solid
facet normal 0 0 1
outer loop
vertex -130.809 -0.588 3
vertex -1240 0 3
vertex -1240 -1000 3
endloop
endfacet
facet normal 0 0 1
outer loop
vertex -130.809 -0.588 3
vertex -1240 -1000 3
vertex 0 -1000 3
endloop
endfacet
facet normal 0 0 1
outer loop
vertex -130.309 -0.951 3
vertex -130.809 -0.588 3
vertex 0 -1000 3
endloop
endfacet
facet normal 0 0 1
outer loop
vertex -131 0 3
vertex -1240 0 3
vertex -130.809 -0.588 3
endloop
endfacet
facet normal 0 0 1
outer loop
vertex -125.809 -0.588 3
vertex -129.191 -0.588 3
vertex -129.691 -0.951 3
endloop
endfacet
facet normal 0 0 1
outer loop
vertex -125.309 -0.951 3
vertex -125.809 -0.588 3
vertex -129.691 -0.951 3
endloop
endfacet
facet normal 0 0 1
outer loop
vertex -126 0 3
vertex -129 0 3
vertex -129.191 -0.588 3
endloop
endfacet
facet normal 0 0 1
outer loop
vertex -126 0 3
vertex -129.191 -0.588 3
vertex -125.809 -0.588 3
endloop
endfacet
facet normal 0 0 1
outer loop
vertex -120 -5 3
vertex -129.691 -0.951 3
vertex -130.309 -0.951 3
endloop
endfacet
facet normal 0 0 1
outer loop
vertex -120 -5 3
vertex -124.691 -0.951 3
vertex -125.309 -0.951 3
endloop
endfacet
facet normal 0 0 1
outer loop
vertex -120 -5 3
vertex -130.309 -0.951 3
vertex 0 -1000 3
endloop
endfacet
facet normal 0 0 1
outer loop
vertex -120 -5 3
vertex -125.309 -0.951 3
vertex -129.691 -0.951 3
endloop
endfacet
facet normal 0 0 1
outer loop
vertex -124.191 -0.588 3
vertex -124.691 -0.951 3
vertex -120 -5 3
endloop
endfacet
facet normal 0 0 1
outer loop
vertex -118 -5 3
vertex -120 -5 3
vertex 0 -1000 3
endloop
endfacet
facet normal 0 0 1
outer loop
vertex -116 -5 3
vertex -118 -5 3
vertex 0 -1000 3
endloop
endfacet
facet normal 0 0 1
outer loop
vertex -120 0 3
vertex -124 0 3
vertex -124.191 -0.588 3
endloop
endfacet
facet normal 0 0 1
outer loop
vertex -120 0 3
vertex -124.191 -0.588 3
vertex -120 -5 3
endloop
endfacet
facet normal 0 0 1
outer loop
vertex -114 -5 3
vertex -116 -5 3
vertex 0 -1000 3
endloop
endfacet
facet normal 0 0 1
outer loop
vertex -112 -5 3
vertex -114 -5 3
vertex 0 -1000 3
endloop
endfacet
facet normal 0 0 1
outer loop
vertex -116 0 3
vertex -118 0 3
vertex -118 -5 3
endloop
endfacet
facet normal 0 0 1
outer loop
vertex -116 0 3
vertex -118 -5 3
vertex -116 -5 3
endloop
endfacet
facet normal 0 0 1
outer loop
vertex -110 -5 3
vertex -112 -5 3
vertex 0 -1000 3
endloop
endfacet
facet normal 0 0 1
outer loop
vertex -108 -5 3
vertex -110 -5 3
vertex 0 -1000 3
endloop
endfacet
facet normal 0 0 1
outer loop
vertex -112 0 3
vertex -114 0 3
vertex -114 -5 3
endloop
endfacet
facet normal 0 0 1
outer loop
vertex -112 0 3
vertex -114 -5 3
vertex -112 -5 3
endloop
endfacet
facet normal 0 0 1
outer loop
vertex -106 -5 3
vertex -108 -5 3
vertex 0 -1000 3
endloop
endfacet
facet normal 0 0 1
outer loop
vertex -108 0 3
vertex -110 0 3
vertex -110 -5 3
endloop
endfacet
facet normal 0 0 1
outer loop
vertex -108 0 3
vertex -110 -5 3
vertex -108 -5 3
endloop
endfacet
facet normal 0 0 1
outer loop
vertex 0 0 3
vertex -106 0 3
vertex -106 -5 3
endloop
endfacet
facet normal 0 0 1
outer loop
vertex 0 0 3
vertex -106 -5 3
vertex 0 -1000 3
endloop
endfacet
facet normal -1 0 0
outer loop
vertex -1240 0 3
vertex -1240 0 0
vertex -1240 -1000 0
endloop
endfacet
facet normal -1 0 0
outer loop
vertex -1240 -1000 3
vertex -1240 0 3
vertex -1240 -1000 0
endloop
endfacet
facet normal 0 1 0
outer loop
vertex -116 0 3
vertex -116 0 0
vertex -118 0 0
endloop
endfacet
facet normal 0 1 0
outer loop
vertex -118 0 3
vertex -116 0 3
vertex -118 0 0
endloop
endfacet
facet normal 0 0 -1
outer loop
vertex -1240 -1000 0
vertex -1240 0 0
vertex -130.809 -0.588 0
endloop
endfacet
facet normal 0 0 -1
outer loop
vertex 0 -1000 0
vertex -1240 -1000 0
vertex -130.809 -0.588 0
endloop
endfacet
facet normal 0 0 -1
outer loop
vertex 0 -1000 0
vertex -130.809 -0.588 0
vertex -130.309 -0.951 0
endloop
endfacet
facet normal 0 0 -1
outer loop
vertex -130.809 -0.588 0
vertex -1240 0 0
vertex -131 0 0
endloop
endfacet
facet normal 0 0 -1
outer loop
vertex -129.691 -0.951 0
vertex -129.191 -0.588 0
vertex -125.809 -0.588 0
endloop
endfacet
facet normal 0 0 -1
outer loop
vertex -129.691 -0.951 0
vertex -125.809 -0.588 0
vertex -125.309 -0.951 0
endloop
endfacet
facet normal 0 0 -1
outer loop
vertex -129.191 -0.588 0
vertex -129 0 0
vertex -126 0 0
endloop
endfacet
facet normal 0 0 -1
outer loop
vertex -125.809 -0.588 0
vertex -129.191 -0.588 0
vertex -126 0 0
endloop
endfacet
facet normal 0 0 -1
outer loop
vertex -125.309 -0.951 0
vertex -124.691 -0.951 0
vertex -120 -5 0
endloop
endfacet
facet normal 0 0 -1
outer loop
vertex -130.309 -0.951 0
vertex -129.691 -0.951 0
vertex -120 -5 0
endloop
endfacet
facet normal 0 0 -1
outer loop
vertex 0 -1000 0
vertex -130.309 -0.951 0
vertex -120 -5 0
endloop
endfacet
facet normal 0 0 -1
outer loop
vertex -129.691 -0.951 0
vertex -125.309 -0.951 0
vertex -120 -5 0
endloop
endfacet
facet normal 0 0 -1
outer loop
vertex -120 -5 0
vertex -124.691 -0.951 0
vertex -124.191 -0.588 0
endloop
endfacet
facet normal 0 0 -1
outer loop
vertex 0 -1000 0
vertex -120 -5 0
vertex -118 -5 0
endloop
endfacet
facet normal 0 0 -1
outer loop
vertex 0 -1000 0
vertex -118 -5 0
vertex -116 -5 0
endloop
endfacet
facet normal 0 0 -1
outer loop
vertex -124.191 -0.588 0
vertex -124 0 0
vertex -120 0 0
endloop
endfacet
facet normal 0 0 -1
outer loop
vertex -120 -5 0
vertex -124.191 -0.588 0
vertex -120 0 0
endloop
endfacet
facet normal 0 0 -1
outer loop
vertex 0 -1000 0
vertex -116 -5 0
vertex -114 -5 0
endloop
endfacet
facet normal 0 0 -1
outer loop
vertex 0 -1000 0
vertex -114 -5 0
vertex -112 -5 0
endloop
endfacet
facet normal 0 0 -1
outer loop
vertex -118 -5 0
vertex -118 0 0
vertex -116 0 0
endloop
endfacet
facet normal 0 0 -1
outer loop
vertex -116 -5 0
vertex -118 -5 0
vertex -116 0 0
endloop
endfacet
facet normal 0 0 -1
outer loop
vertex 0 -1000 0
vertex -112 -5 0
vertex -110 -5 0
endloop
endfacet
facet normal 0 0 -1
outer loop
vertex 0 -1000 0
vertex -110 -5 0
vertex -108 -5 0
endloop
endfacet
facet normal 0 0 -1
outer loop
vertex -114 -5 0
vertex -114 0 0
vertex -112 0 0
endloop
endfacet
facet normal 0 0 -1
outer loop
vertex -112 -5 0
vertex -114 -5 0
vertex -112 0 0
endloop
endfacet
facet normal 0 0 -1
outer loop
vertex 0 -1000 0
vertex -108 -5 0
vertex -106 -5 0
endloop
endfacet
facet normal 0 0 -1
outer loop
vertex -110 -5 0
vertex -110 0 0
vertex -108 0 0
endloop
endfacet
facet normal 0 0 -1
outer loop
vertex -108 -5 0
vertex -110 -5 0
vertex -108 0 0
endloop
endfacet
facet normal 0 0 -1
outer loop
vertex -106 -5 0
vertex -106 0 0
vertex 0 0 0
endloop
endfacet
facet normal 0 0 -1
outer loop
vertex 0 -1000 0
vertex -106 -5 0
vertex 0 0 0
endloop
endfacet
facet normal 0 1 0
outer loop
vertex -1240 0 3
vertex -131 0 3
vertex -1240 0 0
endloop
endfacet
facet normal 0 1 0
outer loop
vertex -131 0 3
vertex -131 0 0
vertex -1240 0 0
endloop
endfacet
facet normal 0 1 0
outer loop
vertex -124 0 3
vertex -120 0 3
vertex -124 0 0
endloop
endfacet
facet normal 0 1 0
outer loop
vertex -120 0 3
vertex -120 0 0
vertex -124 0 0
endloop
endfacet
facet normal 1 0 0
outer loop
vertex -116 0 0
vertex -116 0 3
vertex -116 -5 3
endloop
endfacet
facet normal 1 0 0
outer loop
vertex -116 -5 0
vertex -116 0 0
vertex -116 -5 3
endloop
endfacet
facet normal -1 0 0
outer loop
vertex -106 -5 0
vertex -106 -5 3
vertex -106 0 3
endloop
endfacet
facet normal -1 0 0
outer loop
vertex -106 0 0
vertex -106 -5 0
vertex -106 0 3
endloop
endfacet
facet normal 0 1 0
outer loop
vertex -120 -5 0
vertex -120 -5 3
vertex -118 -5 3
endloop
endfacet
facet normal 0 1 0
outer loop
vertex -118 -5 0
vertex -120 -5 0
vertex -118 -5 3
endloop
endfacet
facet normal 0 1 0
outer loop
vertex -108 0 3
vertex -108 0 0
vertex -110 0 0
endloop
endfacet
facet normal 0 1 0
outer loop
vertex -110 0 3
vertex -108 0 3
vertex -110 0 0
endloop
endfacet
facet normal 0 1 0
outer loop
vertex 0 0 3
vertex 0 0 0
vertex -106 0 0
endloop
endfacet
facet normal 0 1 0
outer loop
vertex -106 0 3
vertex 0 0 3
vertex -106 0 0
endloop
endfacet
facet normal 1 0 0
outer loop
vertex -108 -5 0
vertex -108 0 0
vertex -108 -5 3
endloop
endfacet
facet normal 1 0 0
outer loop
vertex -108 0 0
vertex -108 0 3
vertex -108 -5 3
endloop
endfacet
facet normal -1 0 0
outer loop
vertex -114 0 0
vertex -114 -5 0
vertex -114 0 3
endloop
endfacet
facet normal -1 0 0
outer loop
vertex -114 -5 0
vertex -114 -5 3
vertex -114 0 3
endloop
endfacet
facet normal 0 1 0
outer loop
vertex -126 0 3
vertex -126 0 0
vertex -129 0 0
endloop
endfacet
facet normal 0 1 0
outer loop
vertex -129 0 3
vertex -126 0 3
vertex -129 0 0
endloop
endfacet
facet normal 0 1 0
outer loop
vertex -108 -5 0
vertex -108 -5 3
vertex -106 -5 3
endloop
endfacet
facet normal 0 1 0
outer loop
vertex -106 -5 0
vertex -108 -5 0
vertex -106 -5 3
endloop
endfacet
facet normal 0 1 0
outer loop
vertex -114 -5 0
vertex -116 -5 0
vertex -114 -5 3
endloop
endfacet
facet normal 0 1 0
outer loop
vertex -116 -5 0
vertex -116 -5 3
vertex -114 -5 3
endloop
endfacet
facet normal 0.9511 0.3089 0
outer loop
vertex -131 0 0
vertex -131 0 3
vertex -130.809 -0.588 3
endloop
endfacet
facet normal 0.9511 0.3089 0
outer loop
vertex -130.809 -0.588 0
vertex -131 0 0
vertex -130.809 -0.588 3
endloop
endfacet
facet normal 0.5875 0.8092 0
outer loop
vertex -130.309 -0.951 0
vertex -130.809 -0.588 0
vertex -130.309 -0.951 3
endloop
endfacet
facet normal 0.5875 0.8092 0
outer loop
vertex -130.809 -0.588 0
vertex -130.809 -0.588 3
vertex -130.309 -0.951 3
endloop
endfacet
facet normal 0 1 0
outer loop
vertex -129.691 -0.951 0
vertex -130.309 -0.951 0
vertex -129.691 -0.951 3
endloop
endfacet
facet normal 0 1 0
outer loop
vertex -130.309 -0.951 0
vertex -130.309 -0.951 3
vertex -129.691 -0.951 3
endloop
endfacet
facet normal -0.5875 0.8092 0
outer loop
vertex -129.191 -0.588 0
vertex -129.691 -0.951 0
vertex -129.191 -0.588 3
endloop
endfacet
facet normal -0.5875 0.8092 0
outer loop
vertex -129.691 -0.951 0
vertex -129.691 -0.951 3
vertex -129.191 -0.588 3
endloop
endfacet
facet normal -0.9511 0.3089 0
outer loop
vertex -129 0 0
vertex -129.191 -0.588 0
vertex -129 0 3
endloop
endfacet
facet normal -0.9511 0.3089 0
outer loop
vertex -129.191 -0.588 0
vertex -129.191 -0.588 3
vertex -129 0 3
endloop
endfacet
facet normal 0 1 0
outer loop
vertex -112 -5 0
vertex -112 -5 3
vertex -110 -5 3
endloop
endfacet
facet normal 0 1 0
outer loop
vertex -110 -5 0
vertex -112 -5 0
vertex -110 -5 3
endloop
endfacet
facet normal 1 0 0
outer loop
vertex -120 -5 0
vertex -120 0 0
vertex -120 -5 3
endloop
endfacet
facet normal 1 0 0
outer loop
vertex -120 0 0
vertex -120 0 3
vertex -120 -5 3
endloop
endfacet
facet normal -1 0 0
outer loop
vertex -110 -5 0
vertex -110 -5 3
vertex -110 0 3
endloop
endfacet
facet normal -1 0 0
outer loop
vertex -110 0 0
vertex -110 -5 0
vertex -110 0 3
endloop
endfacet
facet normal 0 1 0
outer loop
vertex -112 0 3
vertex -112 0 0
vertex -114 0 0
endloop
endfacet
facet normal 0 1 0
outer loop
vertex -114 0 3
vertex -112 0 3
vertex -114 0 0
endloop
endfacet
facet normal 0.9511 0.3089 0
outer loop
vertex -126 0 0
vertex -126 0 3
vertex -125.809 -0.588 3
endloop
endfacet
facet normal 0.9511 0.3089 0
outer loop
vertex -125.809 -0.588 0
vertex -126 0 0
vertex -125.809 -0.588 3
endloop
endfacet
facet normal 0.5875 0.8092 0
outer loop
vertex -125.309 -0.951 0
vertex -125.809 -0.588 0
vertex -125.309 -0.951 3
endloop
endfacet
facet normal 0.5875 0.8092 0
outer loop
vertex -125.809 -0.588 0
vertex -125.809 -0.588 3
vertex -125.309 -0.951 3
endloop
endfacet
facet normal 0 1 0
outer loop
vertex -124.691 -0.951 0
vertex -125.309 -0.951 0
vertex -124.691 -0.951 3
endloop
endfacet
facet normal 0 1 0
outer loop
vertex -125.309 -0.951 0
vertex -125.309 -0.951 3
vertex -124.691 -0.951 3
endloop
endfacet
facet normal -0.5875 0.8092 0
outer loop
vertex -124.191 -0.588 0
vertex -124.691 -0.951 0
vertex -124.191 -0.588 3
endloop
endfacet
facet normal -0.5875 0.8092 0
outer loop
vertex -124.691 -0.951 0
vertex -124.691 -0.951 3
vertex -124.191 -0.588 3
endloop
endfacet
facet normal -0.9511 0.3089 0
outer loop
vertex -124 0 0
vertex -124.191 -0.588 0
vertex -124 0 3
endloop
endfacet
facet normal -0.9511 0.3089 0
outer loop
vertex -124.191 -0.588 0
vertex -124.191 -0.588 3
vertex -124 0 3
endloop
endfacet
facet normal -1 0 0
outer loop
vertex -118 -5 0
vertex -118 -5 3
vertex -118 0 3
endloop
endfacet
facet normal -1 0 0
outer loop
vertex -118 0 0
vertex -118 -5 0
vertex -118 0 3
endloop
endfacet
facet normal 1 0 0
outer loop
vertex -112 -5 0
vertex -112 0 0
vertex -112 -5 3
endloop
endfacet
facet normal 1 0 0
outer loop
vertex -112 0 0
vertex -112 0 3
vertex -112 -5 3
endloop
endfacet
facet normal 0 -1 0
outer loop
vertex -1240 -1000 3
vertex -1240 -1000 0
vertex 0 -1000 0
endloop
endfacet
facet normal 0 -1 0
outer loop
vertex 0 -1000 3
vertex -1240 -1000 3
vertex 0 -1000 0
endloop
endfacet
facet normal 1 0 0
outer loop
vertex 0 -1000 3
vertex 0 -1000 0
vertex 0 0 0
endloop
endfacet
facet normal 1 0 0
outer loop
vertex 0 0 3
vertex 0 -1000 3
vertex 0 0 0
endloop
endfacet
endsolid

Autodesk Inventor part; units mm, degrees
ref_plane "YZ Plane" through (0, 0, 0) normal (1, 0, 0) x (0, 1, 0)
ref_plane "XZ Plane" through (0, 0, 0) normal (0, 1, 0) x (-1, 0, 0)
ref_plane "XY Plane" through (0, 0, 0) normal (0, 0, 1) x (1, 0, 0)
sketch "Sketch1" plane through (0, 0, 0) normal (0, 0, 1) x (1, 0, 0)
  line L0 (0, 0) -> (-1240, 0)
  line L1 (-1240, 0) -> (-1240, -1000)
  line L2 (-1240, -1000) -> (0, -1000)
  line L3 (0, -1000) -> (0, 0)
  line L4 (0, 0) -> (-35, 0)
  line L5 (-35, 0) -> (-35, -35)
  line L6 (-35, -35) -> (0, -35)
  line L7 (0, -35) -> (0, 0)
  line L8 (0, -1000) -> (-35, -1000)
  line L9 (-35, -1000) -> (-35, -965)
  line L10 (-35, -965) -> (0, -965)
  line L11 (0, -965) -> (0, -1000)
  line L12 (-1240, 0) -> (-1205, 0)
  line L13 (-1205, 0) -> (-1205, -35)
  line L14 (-1205, -35) -> (-1240, -35)
  line L15 (-1240, -35) -> (-1240, 0)
  line L16 (-1240, -1000) -> (-1205, -1000)
  line L17 (-1205, -1000) -> (-1205, -965)
  line L18 (-1205, -965) -> (-1240, -965)
  line L19 (-1240, -965) -> (-1240, -1000)
  line L20 (-1095, -1000) -> (-1005, -1000)
  line L21 (-1005, -1000) -> (-1005, -965)
  line L22 (-1005, -965) -> (-1095, -965)
  line L23 (-1095, -965) -> (-1095, -1000)
  line L24 (-1095, 0) -> (-1005, 0)
  line L25 (-1005, 0) -> (-1005, -35)
  line L26 (-1005, -35) -> (-1095, -35)
  line L27 (-1095, -35) -> (-1095, 0)
  point P0 (0, -35)
  point P1 (-35, -1000)
  point P2 (0, -965)
  point P3 (-1005, -1000)
  point P4 (-1005, 0)
  dimension "d22" = 1240
  dimension "d23" = 1000
  dimension "d24" = 35
  dimension "d25" = 35
  dimension "d28" = 90
  dimension "d29" = 970
extrude "Plate1" add sketch "Sketch1" along normal blind 3
sketch "Sketch5" plane through (0, 0, 3) normal (0, 0, 1) x (1, 0, 0)
  line L0 (0, 0) -> (-100, 0) construction
  line L1 (-100, 0) -> (-100, -2) construction
  line L2 (-100, -2) -> (0, -2) construction
  line L3 (0, -2) -> (0, 0) construction
  line L4 (-100, 0) -> (-101.5248, -4.6556)
  arc A0 (-102.4752, -4.6556) -> (-101.5248, -4.6556) centre (-102, -4.5) ccw
  line L5 (-102.4752, -4.6556) -> (-104, 0)
  line L6 (-104, 0) -> (-100, 0)
  line L7 (-104, 0) -> (-106, 0) construction
  line L8 (-106, 0) -> (-108, 0)
  line L9 (-108, 0) -> (-108, -5)
  line L10 (-108, -5) -> (-106, -5)
  line L11 (-106, -5) -> (-106, 0)
  line L12 (-108, 0) -> (-110, 0) construction
  line L13 (-110, 0) -> (-112, 0)
  line L14 (-112, 0) -> (-112, -5)
  line L15 (-112, -5) -> (-110, -5)
  line L16 (-110, -5) -> (-110, 0)
  line L17 (-112, 0) -> (-114, 0) construction
  line L18 (-114, 0) -> (-116, 0)
  line L19 (-116, 0) -> (-116, -5)
  line L20 (-116, -5) -> (-114, -5)
  line L21 (-114, -5) -> (-114, 0)
  line L22 (-116, 0) -> (-118, 0) construction
  line L23 (-118, 0) -> (-120, 0)
  line L24 (-120, 0) -> (-120, -5)
  line L25 (-120, -5) -> (-118, -5)
  line L26 (-118, -5) -> (-118, 0)
  line L27 (-120, 0) -> (-125, 0) construction
  line L28 (-125, 0) -> (-130, 0) construction
  circle A1 centre (-125, 0) radius 1
  circle A2 centre (-130, 0) radius 1
  point P0 (-102, 0)
  dimension "d30" = 100
  dimension "d31" = 2
  dimension "d32" = 5
  dimension "d33" = 4
  dimension "d34" = 0.5
  dimension "d35" = 5
  dimension "d36" = 5
  dimension "d37" = 5
  dimension "d38" = 2
extrude "Cut1" cut sketch "Sketch5" against normal blind 3 contours L11 L10 L9 L8 | L16 L15 L14 L13 | L21 L20 L19 L18 | L26 L25 L24 L23 | A1 | A2
equation "\"d24\" = d25"
equation "\"d33\" = 2 * d31"
equation "\"d34\" = 0.25 * d31"
equation "\"d38\" = d31"
equation "\"d39\" = Thickness"
equation "\"d2\" = Thickness"
equation "\"BendReliefWidth\" = Thickness"
equation "\"BendReliefDepth\" = 0.5 * Thickness"
equation "\"CornerReliefSize\" = 4 * Thickness"
equation "\"MinimumRemnant\" = 2 * Thickness"
equation "\"TransitionRadius\" = BendRadius"
equation "\"JacobiRadiusSize\" = BendRadius"
equation "\"GapSize\" = Thickness"
equation "\"Thickness\" = 3"
equation "\"BendRadius\" = 5"
properties part number "GnG frame 2 floor sheet 5" material "Stainless Steel"
